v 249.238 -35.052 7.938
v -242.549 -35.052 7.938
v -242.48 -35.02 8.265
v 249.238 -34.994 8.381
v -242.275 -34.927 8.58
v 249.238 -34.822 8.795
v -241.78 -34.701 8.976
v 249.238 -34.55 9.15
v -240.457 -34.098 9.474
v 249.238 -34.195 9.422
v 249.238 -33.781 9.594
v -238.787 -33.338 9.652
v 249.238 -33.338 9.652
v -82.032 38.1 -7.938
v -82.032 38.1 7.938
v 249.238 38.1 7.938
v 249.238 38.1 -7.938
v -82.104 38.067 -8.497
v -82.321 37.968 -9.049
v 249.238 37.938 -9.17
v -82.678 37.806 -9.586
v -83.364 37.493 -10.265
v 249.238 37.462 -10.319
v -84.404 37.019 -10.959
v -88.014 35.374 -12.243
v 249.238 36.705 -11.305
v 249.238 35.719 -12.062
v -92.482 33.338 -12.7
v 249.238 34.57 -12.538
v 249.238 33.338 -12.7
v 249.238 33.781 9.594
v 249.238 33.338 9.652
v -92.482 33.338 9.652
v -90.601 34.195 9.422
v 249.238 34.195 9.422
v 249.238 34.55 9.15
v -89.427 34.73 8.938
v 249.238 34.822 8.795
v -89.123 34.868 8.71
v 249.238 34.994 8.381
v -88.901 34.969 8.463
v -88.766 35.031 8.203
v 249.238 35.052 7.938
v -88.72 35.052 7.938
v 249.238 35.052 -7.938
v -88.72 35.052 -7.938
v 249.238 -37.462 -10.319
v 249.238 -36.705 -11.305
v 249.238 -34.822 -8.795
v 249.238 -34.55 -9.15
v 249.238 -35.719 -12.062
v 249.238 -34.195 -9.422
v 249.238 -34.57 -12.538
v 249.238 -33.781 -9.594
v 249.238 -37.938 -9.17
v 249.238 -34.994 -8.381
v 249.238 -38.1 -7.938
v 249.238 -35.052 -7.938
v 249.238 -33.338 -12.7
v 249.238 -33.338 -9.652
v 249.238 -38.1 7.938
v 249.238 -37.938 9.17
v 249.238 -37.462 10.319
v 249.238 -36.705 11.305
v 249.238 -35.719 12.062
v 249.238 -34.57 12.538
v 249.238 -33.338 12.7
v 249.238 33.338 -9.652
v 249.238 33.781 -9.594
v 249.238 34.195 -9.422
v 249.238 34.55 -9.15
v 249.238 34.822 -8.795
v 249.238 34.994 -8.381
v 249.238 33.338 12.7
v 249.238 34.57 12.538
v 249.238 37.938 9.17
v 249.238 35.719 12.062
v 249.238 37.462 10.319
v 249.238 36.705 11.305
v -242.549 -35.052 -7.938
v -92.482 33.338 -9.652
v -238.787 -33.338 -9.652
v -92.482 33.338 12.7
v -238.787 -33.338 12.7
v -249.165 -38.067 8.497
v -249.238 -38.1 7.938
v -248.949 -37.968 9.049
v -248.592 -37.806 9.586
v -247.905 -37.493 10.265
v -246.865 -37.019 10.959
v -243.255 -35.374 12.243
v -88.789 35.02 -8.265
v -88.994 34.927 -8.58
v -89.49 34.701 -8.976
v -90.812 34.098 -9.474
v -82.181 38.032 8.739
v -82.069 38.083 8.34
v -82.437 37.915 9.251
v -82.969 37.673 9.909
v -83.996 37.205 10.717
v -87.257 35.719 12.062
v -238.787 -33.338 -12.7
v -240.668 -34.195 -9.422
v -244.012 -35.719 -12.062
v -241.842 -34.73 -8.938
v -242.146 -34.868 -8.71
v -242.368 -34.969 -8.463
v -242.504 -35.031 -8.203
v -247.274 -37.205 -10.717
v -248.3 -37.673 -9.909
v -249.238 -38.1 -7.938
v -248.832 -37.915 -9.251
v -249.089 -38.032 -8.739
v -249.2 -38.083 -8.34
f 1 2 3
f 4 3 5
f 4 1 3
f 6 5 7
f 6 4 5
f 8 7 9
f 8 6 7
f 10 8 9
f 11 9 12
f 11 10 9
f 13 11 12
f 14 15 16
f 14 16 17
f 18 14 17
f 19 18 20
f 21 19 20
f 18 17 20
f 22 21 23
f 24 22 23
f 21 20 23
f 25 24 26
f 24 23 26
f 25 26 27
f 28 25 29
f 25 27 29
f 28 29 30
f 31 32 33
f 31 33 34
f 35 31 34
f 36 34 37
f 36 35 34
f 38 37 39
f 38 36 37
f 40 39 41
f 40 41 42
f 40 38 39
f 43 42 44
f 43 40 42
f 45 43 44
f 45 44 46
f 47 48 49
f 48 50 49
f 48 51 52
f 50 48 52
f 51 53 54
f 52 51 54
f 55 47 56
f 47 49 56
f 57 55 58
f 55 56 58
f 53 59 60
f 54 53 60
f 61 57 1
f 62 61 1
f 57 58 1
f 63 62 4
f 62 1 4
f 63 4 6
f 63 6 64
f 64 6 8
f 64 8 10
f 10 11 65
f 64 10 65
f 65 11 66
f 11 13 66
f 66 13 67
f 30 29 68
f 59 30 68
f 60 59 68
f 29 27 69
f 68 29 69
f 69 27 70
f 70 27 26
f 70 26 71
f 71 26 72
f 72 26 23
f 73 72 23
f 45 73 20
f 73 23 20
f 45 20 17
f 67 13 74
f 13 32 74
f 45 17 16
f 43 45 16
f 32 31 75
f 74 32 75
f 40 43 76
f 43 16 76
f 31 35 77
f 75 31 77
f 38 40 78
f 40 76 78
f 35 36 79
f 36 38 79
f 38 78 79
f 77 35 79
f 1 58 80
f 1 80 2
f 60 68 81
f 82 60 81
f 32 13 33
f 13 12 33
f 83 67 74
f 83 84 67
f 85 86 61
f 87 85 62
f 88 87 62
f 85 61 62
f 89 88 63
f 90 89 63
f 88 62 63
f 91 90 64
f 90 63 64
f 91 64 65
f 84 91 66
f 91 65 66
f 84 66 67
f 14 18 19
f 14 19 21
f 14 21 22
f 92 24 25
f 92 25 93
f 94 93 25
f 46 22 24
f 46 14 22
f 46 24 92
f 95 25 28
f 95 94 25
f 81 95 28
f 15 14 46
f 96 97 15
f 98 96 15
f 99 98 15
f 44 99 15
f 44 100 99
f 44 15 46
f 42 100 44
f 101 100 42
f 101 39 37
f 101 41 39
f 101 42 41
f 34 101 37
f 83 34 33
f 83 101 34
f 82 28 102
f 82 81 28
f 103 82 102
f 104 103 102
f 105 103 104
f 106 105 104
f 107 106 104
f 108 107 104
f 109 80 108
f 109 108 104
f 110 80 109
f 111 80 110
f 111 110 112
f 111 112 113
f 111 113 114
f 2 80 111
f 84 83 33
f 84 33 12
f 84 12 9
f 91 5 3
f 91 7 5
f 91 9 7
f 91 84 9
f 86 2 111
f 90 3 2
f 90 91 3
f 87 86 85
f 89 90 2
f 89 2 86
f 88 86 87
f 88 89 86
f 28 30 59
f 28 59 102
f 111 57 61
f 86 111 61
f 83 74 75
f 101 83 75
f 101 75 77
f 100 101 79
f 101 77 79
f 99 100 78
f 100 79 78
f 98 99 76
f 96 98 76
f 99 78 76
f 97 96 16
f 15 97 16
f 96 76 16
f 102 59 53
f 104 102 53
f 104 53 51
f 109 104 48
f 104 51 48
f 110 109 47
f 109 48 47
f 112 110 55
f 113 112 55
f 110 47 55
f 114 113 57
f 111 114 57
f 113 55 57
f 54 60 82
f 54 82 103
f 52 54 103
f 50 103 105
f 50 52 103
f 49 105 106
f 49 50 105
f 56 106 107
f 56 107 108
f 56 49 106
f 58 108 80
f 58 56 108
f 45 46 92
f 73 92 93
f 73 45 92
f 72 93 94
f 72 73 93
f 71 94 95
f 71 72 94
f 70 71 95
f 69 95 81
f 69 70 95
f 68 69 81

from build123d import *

# Parameters (mm, degrees)
RECTANGULAR_TUBE_3_X_2_X_0_25_1_DEPTH = 498.475
CUT_EXTRUDE1_DEPTH                    = 254.408960785


with BuildPart() as part:
    # Sketch13 → Rectangular tube 3 X 2 X 0.25(1) (new body)
    with BuildSketch(Plane.ZY.offset(-249.2375)):
        with BuildLine():
            Line((-7.9375, -38.1), (7.9375, -38.1))
            ThreePointArc((7.9375, -38.1), (11.305096045, -36.705096045), (12.7, -33.3375))
            Line((12.7, -33.3375), (12.7, 33.3375))
            ThreePointArc((12.7, 33.3375), (11.305096045, 36.705096045), (7.9375, 38.1))
            Line((7.9375, 38.1), (-7.9375, 38.1))
            ThreePointArc((-7.9375, 38.1), (-11.305096045, 36.705096045), (-12.7, 33.3375))
            Line((-12.7, 33.3375), (-12.7, -33.3375))
            ThreePointArc((-12.7, -33.3375), (-11.305096045, -36.705096045), (-7.9375, -38.1))
        make_face()
        with BuildLine():
            Line((-7.9375, -35.052), (7.9375, -35.052))
            ThreePointArc((7.9375, -35.052), (9.149834576, -34.549834576), (9.652, -33.3375))
            Line((9.652, -33.3375), (9.652, 33.3375))
            ThreePointArc((9.652, 33.3375), (9.149834576, 34.549834576), (7.9375, 35.052))
            Line((7.9375, 35.052), (-7.9375, 35.052))
            ThreePointArc((-7.9375, 35.052), (-9.149834576, 34.549834576), (-9.652, 33.3375))
            Line((-9.652, 33.3375), (-9.652, -33.3375))
            ThreePointArc((-9.652, -33.3375), (-9.149834576, -34.549834576), (-7.9375, -35.052))
        make_face(mode=Mode.SUBTRACT)
    extrude(amount=RECTANGULAR_TUBE_3_X_2_X_0_25_1_DEPTH)

    # s → Cut-Extrude1 (cut, through all)
    with BuildSketch(Plane.XY.offset(12.7)):
        Polygon((-249.2375, -38.1), (-249.2375, 38.1), (-82.031860485, 38.1), align=None)
    extrude(amount=-CUT_EXTRUDE1_DEPTH, mode=Mode.SUBTRACT)


solid = part.part
